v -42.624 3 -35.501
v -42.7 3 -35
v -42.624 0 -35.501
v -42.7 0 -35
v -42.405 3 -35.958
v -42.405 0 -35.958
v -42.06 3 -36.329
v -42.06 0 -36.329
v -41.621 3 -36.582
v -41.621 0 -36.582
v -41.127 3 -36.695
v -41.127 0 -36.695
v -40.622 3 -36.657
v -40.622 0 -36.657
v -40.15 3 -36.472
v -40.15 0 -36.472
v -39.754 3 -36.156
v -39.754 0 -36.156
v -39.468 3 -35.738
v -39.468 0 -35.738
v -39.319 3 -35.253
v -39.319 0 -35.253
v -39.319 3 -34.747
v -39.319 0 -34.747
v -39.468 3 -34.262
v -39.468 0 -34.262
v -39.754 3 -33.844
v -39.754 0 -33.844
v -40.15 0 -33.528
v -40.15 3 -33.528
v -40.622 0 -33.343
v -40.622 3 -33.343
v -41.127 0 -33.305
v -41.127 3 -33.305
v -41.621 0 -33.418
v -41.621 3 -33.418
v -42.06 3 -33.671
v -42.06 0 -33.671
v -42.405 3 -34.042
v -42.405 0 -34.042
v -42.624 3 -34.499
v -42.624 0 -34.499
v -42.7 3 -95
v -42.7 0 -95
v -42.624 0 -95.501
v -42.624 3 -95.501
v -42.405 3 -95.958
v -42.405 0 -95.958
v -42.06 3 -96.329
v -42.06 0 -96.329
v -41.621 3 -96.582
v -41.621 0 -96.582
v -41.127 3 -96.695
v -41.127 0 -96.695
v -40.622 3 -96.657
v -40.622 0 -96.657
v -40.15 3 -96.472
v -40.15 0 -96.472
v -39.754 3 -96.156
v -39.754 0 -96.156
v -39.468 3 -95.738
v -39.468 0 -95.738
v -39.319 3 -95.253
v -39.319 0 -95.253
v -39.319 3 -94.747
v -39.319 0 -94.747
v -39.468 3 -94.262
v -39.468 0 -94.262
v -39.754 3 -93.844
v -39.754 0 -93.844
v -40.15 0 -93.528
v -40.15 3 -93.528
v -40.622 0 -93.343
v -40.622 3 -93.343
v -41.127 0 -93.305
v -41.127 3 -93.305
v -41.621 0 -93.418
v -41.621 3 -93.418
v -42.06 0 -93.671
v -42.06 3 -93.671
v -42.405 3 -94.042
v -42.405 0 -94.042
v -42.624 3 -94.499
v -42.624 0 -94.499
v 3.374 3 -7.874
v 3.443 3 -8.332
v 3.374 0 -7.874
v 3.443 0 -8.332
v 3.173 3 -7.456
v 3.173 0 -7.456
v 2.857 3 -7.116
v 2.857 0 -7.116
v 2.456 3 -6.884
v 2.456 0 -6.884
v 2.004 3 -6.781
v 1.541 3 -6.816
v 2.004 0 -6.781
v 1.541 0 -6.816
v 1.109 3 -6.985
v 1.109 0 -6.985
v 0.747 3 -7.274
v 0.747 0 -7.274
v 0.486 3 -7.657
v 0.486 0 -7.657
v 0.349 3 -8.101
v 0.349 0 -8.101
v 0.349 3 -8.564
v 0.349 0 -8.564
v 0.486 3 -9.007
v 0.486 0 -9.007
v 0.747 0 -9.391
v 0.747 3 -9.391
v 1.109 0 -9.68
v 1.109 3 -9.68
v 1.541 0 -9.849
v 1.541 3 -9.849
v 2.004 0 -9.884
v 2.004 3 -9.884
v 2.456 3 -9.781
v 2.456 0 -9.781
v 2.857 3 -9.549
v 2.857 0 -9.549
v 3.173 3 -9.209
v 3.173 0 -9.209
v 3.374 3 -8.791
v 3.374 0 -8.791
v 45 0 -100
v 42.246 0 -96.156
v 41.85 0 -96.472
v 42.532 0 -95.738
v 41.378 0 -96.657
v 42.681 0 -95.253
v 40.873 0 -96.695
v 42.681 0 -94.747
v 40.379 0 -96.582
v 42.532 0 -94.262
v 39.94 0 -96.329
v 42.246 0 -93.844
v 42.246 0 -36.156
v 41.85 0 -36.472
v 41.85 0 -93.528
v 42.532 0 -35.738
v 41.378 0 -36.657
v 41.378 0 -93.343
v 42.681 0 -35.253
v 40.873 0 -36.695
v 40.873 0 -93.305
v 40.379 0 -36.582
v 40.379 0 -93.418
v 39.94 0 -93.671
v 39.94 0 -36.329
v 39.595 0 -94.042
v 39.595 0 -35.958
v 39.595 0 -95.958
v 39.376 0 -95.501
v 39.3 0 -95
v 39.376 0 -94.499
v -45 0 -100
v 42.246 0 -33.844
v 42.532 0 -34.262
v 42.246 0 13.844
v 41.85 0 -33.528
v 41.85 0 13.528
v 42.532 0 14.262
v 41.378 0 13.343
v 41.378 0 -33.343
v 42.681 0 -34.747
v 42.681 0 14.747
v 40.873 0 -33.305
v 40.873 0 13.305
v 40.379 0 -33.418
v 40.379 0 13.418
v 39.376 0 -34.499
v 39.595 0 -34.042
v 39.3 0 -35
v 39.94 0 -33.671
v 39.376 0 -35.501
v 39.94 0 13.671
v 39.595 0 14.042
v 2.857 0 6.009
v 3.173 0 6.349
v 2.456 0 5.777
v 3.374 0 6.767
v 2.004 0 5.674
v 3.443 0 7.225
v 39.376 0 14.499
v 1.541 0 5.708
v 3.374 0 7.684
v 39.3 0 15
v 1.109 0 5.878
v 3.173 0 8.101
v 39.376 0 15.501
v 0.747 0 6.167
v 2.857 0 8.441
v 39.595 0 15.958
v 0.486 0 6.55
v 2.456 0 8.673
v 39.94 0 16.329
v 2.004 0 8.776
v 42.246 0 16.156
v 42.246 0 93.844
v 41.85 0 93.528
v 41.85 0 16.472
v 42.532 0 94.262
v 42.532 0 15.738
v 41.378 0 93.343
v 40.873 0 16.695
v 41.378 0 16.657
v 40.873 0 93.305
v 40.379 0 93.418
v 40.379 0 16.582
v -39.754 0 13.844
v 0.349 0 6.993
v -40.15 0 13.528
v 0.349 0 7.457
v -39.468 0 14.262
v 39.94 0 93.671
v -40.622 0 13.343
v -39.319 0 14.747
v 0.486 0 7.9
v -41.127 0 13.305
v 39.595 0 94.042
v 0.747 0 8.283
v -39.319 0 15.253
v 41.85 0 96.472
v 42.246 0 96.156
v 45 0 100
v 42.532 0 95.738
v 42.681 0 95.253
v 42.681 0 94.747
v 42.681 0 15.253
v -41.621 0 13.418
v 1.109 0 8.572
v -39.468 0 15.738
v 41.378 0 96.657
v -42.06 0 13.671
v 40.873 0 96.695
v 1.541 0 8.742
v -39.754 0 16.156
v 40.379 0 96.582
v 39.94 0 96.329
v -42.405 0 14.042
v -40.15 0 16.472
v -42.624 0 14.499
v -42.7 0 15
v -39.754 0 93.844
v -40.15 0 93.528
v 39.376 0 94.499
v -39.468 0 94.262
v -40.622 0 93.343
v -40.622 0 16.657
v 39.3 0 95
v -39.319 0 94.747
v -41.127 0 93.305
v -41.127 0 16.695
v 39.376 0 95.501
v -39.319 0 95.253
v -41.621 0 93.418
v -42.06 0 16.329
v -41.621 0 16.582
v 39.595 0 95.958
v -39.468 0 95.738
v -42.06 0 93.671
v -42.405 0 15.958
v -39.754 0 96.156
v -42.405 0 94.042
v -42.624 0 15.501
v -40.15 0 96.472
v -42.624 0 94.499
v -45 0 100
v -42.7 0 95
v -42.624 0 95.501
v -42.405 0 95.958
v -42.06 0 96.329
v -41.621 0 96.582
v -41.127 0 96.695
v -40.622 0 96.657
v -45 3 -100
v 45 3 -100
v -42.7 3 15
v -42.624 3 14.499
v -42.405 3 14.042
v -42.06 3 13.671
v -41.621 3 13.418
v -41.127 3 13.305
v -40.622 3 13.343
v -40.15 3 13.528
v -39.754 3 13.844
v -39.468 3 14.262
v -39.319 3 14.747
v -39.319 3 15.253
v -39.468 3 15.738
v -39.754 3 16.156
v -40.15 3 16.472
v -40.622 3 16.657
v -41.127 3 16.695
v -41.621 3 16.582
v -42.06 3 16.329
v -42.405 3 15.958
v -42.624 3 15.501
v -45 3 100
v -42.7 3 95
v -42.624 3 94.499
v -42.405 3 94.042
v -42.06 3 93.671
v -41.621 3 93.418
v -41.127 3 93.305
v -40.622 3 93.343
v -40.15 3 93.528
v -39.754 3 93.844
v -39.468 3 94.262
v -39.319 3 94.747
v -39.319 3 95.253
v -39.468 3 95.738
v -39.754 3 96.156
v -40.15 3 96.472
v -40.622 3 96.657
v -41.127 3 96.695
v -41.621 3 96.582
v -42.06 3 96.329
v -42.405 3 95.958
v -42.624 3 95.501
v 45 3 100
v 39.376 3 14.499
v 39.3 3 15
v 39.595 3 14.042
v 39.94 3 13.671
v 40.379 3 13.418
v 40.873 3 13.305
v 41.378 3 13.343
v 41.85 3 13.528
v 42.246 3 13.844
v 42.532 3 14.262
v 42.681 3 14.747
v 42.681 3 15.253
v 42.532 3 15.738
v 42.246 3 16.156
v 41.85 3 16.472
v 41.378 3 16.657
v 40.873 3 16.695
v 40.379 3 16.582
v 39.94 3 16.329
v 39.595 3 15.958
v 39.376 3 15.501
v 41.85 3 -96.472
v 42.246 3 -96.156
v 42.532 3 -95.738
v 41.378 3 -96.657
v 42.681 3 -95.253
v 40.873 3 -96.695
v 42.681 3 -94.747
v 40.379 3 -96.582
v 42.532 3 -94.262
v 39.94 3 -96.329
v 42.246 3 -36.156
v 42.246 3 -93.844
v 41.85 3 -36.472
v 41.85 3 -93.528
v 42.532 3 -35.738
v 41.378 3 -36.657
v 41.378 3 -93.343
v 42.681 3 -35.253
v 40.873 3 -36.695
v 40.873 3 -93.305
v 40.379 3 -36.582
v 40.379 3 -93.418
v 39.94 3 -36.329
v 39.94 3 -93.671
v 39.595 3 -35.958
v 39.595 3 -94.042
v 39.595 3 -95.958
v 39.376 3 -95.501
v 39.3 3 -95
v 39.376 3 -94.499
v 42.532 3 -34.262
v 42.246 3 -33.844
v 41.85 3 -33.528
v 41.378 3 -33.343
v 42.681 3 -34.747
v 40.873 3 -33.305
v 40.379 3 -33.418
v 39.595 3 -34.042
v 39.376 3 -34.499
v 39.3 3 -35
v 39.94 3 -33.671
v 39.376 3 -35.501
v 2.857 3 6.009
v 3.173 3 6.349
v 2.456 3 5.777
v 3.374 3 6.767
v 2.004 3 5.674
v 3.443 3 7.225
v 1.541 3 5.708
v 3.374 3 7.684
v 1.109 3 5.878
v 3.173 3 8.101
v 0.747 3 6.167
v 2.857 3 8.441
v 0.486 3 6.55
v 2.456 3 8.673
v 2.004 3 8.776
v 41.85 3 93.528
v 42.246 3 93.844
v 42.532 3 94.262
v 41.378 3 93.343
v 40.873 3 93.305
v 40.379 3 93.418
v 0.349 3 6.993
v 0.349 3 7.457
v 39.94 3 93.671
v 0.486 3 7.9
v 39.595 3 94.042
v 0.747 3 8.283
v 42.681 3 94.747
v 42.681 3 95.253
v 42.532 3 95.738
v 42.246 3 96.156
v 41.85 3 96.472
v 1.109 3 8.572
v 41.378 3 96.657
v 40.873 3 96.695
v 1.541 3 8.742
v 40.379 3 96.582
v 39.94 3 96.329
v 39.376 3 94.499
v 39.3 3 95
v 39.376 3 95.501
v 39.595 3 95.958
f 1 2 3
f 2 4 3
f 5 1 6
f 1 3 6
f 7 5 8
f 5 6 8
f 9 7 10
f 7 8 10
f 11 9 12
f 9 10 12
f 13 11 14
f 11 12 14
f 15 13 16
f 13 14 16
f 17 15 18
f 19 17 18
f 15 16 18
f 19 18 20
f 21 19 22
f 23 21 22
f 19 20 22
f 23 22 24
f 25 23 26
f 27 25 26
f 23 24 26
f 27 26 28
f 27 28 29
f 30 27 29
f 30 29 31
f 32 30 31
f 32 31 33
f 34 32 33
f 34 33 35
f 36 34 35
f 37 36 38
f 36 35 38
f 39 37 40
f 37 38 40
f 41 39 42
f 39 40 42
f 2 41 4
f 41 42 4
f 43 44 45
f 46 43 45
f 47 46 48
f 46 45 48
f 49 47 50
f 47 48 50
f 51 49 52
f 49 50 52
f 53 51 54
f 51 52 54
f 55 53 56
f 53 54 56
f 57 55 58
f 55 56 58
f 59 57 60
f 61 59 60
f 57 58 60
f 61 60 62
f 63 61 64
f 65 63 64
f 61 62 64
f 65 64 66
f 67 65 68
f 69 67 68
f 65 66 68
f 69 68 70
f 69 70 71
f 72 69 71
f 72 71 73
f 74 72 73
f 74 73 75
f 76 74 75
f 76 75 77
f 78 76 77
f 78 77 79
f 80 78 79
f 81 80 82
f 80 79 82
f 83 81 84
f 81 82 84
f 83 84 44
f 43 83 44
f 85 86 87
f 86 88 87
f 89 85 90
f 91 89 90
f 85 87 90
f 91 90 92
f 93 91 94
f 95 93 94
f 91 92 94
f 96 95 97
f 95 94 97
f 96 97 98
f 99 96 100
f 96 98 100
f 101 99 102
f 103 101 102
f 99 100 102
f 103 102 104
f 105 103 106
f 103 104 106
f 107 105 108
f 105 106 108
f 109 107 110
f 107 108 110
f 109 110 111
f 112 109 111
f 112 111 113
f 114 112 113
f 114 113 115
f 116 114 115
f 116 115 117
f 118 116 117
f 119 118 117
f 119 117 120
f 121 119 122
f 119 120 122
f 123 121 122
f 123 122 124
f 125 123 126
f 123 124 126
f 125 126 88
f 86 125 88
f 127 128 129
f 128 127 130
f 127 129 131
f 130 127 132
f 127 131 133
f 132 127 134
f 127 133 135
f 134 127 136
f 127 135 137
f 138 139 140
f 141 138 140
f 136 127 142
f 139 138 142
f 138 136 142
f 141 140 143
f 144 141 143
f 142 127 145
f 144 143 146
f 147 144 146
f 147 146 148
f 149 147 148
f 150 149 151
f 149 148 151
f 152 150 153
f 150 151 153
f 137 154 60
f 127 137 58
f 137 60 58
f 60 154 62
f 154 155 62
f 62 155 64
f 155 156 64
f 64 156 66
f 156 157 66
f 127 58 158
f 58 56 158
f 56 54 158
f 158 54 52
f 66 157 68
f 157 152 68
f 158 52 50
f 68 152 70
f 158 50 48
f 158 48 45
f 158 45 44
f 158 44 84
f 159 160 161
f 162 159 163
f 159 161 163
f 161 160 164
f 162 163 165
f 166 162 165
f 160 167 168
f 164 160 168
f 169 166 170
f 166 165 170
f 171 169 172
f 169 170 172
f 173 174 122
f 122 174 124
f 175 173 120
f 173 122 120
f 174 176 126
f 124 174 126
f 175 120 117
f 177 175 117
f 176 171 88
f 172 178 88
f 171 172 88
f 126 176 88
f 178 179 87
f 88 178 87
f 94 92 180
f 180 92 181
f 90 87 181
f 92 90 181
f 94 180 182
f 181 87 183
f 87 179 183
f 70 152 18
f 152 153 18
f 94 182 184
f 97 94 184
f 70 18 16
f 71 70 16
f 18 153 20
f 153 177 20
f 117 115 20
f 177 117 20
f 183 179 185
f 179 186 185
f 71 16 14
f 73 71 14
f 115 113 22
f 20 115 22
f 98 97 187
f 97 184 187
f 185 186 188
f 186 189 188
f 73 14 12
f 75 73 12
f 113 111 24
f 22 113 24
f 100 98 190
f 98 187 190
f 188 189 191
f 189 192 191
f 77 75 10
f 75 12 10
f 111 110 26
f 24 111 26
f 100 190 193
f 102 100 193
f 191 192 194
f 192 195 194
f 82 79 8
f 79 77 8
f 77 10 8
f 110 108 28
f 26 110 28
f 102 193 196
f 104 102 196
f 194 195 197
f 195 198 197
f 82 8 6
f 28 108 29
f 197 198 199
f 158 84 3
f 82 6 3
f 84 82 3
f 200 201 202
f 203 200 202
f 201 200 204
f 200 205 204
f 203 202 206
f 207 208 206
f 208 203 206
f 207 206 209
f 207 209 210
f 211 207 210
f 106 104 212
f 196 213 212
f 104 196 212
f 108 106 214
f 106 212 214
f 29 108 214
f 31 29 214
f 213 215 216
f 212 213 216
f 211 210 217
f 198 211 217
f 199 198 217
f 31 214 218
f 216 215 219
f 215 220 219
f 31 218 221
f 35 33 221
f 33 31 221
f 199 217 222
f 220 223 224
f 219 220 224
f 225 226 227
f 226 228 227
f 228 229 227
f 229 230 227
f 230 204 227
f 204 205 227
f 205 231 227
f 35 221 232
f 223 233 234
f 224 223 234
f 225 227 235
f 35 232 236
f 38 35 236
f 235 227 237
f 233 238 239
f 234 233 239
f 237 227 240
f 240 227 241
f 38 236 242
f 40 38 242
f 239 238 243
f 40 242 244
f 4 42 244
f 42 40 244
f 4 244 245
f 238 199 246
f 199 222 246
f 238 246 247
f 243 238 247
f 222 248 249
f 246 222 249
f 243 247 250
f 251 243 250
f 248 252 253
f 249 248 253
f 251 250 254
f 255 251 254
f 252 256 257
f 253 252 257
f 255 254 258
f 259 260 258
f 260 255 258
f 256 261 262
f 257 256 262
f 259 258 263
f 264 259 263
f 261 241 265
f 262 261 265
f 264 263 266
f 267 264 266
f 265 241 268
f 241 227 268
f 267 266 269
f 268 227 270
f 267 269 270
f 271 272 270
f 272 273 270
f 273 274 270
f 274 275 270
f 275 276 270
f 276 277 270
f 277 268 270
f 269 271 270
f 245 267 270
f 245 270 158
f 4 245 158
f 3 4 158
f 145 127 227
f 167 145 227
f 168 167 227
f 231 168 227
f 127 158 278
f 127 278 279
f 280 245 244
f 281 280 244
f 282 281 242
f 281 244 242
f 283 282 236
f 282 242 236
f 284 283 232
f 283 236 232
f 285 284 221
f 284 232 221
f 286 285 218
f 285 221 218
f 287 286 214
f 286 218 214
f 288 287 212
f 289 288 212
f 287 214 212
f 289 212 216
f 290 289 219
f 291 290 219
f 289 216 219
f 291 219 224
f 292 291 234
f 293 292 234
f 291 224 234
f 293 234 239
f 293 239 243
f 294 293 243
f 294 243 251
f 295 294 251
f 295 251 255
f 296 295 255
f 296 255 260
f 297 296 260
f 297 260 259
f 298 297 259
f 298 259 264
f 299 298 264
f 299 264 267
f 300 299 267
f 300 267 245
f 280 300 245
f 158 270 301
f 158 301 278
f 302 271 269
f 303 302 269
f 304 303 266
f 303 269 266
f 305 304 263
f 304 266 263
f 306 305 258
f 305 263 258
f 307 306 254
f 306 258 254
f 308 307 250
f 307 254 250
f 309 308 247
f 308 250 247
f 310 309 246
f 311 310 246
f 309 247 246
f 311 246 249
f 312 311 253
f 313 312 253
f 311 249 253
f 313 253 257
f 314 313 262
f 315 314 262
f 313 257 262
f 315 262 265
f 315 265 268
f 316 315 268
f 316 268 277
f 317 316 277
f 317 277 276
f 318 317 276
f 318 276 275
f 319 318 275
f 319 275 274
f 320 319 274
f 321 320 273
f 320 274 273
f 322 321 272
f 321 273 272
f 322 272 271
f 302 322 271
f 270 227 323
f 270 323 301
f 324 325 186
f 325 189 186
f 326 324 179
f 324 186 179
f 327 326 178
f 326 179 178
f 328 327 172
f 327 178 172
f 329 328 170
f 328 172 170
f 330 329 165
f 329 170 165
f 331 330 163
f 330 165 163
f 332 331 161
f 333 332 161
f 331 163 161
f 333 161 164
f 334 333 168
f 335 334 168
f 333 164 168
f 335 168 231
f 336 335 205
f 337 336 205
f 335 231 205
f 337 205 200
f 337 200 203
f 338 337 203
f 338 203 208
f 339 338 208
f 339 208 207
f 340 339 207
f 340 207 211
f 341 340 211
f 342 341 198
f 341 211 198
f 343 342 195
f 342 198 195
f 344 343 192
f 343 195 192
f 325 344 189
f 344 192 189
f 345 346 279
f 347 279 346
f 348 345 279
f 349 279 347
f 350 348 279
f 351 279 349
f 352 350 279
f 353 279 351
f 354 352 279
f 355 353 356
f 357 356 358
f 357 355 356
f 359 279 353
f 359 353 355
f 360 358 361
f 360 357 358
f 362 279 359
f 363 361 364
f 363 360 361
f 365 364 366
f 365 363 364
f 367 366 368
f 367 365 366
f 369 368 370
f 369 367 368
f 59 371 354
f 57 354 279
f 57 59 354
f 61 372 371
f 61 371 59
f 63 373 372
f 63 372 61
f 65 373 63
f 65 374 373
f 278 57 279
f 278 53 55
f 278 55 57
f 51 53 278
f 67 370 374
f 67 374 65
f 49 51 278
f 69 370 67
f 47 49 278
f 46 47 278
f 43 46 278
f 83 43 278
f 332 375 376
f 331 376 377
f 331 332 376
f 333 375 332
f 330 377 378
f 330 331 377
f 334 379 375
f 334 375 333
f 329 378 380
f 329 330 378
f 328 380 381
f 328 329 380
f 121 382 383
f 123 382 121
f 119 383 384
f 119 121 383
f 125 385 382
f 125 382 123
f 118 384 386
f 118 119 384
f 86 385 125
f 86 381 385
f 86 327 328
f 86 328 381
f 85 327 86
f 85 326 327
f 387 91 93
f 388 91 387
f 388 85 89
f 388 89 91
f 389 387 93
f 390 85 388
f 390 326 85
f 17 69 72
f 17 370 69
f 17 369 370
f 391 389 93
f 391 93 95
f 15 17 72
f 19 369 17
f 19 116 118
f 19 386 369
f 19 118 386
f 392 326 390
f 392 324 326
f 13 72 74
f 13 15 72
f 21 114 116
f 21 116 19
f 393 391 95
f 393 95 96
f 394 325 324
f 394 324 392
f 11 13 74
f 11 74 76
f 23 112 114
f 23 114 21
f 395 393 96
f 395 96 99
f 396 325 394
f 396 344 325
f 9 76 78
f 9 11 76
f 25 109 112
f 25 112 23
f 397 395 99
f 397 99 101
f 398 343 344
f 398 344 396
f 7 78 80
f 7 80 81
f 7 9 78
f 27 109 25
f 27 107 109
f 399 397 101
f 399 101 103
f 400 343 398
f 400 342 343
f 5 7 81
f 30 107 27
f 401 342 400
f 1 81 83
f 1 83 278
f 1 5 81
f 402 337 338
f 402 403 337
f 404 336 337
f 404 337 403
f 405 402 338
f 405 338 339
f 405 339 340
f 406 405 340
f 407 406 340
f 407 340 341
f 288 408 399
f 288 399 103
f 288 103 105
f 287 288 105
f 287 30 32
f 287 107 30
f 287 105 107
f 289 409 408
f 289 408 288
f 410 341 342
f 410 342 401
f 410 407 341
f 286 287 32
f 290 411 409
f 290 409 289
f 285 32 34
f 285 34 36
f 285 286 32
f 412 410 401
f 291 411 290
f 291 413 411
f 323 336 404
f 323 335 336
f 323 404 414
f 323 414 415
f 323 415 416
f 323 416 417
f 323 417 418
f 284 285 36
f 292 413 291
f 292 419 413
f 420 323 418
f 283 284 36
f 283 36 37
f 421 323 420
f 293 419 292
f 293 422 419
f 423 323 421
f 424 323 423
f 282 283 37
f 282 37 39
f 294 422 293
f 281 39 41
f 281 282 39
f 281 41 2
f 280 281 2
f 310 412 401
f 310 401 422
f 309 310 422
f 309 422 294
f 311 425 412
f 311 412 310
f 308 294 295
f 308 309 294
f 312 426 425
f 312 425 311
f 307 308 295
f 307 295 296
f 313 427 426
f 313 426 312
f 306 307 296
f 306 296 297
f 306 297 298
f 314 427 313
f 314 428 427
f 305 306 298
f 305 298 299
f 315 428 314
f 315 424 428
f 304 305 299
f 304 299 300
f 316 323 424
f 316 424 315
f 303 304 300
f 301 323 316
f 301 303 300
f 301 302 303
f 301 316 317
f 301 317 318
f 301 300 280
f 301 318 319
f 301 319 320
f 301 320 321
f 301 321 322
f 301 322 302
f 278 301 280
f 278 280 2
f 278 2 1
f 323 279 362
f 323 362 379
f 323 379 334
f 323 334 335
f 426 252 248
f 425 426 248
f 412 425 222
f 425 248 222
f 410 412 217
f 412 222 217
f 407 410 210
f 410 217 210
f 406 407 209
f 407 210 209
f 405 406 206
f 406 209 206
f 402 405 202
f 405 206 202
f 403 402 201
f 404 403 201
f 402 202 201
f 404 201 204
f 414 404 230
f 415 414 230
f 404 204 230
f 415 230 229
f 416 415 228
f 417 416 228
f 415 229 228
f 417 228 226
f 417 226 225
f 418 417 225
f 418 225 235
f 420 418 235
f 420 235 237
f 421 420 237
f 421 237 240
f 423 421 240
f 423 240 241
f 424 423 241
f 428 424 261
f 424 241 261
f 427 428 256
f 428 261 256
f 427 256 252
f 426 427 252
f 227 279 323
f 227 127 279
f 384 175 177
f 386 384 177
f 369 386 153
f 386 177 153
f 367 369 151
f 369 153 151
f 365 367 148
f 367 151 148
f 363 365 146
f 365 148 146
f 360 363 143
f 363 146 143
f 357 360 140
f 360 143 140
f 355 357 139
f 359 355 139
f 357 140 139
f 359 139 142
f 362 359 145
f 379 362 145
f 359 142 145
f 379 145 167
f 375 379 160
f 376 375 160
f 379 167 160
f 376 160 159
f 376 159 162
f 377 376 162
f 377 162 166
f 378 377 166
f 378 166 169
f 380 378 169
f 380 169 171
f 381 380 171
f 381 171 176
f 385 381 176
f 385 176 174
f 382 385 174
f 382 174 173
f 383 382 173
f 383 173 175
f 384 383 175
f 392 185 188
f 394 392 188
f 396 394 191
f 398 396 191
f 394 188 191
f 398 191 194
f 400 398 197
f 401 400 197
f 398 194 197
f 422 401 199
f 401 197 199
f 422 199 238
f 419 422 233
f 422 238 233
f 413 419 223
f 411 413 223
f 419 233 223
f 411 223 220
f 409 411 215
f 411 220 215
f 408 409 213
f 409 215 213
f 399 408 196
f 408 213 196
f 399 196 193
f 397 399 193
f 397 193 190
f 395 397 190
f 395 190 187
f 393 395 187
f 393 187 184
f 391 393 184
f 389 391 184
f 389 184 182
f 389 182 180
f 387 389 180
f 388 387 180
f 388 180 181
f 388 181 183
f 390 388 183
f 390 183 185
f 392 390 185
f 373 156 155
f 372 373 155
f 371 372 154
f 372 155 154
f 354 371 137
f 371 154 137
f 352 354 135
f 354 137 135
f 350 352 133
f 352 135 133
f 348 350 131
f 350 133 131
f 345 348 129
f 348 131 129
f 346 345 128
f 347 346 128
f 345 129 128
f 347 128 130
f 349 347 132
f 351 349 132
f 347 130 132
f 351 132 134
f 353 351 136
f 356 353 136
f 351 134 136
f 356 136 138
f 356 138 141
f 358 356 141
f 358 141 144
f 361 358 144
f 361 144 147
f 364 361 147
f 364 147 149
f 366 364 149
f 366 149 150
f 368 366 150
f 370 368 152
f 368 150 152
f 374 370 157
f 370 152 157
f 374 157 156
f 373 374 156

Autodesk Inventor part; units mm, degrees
ref_plane "YZ Plane" through (0, 0, 0) normal (1, 0, 0) x (0, 1, 0)
ref_plane "XZ Plane" through (0, 0, 0) normal (0, 1, 0) x (-1, 0, 0)
ref_plane "XY Plane" through (0, 0, 0) normal (0, 0, 1) x (1, 0, 0)
sketch "Skizze1" plane through (0, 0, 0) normal (0, 1, 0) x (-1, 0, 0)
  line L0 (45, 100) -> (45, -100)
  line L1 (45, -100) -> (-45, -100)
  line L2 (-45, -100) -> (-45, 100)
  line L3 (-45, 100) -> (45, 100)
  line L4 (0, 61.8387) -> (0, -129.7607) construction
  line L5 (83.0665, 0) -> (-88.5254, 0) construction
  circle A0 centre (41, 95) radius 1.7
  circle A1 centre (-41, 95) radius 1.7
  circle A2 centre (-41, -95) radius 1.7
  circle A3 centre (41, -95) radius 1.7
  circle A4 centre (3.1127, 7.2251) radius 1.5558
  circle A5 centre (3.1127, -8.3324) radius 1.5558
  circle A6 centre (-41, 15) radius 1.7
  circle A7 centre (41, 15) radius 1.7
  circle A8 centre (-41, -65) radius 1.7
  circle A9 centre (41, -65) radius 1.7
  circle A10 centre (-41, -145) radius 1.7
  circle A11 centre (41, -145) radius 1.7
  circle A12 centre (-41, -225) radius 1.7
  circle A13 centre (41, -225) radius 1.7
  circle A14 centre (-41, -305) radius 1.7
  circle A15 centre (41, -305) radius 1.7
  circle A16 centre (-41, -385) radius 1.7
  circle A17 centre (41, -385) radius 1.7
  circle A18 centre (-41, -465) radius 1.7
  circle A19 centre (41, -465) radius 1.7
  circle A20 centre (-41, -545) radius 1.7
  circle A21 centre (41, -545) radius 1.7
  circle A22 centre (-41, -625) radius 1.7
  circle A23 centre (41, -625) radius 1.7
  circle A24 centre (-41, -705) radius 1.7
  circle A25 centre (41, -705) radius 1.7
  circle A26 centre (-41, -785) radius 1.7
  circle A27 centre (41, -785) radius 1.7
  circle A28 centre (-41, -865) radius 1.7
  circle A29 centre (41, -865) radius 1.7
  circle A30 centre (-41, -945) radius 1.7
  circle A31 centre (41, -945) radius 1.7
  circle A32 centre (-41, -1025) radius 1.7
  circle A33 centre (41, -1025) radius 1.7
  circle A34 centre (-41, -1105) radius 1.7
  circle A35 centre (41, -1105) radius 1.7
  circle A36 centre (-41, -1185) radius 1.7
  circle A37 centre (41, -1185) radius 1.7
  circle A38 centre (-41, -1265) radius 1.7
  circle A39 centre (41, -1265) radius 1.7
  circle A40 centre (-41, -1345) radius 1.7
  circle A41 centre (41, -1345) radius 1.7
  circle A42 centre (-41, -1425) radius 1.7
  circle A43 centre (41, -1425) radius 1.7
  circle A44 centre (-41, -1505) radius 1.7
  circle A45 centre (41, -1505) radius 1.7
  circle A46 centre (-41, -1585) radius 1.7
  circle A47 centre (41, -1585) radius 1.7
  circle A48 centre (-41, -1665) radius 1.7
  circle A49 centre (41, -1665) radius 1.7
  circle A50 centre (-41, -1745) radius 1.7
  circle A51 centre (41, -1745) radius 1.7
  circle A52 centre (-41, -1825) radius 1.7
  circle A53 centre (41, -1825) radius 1.7
  circle A54 centre (-41, -1905) radius 1.7
  circle A55 centre (41, -1905) radius 1.7
  circle A56 centre (-41, -1985) radius 1.7
  circle A57 centre (41, -1985) radius 1.7
  circle A58 centre (-41, -2065) radius 1.7
  circle A59 centre (41, -2065) radius 1.7
  circle A60 centre (-41, -2145) radius 1.7
  circle A61 centre (41, -2145) radius 1.7
  circle A62 centre (-41, -2225) radius 1.7
  circle A63 centre (41, -2225) radius 1.7
  circle A64 centre (-41, -2305) radius 1.7
  circle A65 centre (41, -2305) radius 1.7
  circle A66 centre (-41, -2385) radius 1.7
  circle A67 centre (41, -2385) radius 1.7
  circle A68 centre (-41, -2465) radius 1.7
  circle A69 centre (41, -2465) radius 1.7
  circle A70 centre (-41, -2545) radius 1.7
  circle A71 centre (41, -2545) radius 1.7
  circle A72 centre (-41, -2625) radius 1.7
  circle A73 centre (41, -2625) radius 1.7
  circle A74 centre (-41, -2705) radius 1.7
  circle A75 centre (41, -2705) radius 1.7
  circle A76 centre (-41, -2785) radius 1.7
  circle A77 centre (41, -2785) radius 1.7
  circle A78 centre (-41, -2865) radius 1.7
  circle A79 centre (41, -2865) radius 1.7
  circle A80 centre (-41, -2945) radius 1.7
  circle A81 centre (41, -2945) radius 1.7
  circle A82 centre (-41, -3025) radius 1.7
  circle A83 centre (41, -3025) radius 1.7
  circle A84 centre (-41, -3105) radius 1.7
  circle A85 centre (41, -3105) radius 1.7
  circle A86 centre (-41, -3185) radius 1.7
  circle A87 centre (41, -3185) radius 1.7
  circle A88 centre (-41, -3265) radius 1.7
  circle A89 centre (41, -3265) radius 1.7
  circle A90 centre (-41, -3345) radius 1.7
  circle A91 centre (41, -3345) radius 1.7
  circle A92 centre (-41, -3425) radius 1.7
  circle A93 centre (41, -3425) radius 1.7
  circle A94 centre (-41, -3505) radius 1.7
  circle A95 centre (41, -3505) radius 1.7
  circle A96 centre (-41, -3585) radius 1.7
  circle A97 centre (41, -3585) radius 1.7
  circle A98 centre (-41, -3665) radius 1.7
  circle A99 centre (41, -3665) radius 1.7
  circle A100 centre (-41, -3745) radius 1.7
  circle A101 centre (41, -3745) radius 1.7
  circle A102 centre (-41, -3825) radius 1.7
  circle A103 centre (41, -3825) radius 1.7
  circle A104 centre (-41, -3905) radius 1.7
  circle A105 centre (41, -3905) radius 1.7
  circle A106 centre (-41, -3985) radius 1.7
  circle A107 centre (41, -3985) radius 1.7
  circle A108 centre (-41, -4065) radius 1.7
  circle A109 centre (41, -4065) radius 1.7
  circle A110 centre (-41, -4145) radius 1.7
  circle A111 centre (41, -4145) radius 1.7
  circle A112 centre (-41, -4225) radius 1.7
  circle A113 centre (41, -4225) radius 1.7
  circle A114 centre (-41, -4305) radius 1.7
  circle A115 centre (41, -4305) radius 1.7
  circle A116 centre (-41, -4385) radius 1.7
  circle A117 centre (41, -4385) radius 1.7
  circle A118 centre (-41, -4465) radius 1.7
  circle A119 centre (41, -4465) radius 1.7
  circle A120 centre (-41, -4545) radius 1.7
  circle A121 centre (41, -4545) radius 1.7
  circle A122 centre (-41, -4625) radius 1.7
  circle A123 centre (41, -4625) radius 1.7
  circle A124 centre (-41, -4705) radius 1.7
  circle A125 centre (41, -4705) radius 1.7
  circle A126 centre (-41, -4785) radius 1.7
  circle A127 centre (41, -4785) radius 1.7
  circle A128 centre (-41, -4865) radius 1.7
  circle A129 centre (41, -4865) radius 1.7
  circle A130 centre (-41, -4945) radius 1.7
  circle A131 centre (41, -4945) radius 1.7
  circle A132 centre (-41, -5025) radius 1.7
  circle A133 centre (41, -5025) radius 1.7
  circle A134 centre (-41, -5105) radius 1.7
  circle A135 centre (41, -5105) radius 1.7
  circle A136 centre (-41, -5185) radius 1.7
  circle A137 centre (41, -5185) radius 1.7
  circle A138 centre (-41, -5265) radius 1.7
  circle A139 centre (41, -5265) radius 1.7
  circle A140 centre (-41, -5345) radius 1.7
  circle A141 centre (41, -5345) radius 1.7
  circle A142 centre (-41, -5425) radius 1.7
  circle A143 centre (41, -5425) radius 1.7
  circle A144 centre (-41, -5505) radius 1.7
  circle A145 centre (41, -5505) radius 1.7
  circle A146 centre (-41, -5585) radius 1.7
  circle A147 centre (41, -5585) radius 1.7
  circle A148 centre (-41, -5665) radius 1.7
  circle A149 centre (41, -5665) radius 1.7
  circle A150 centre (-41, -5745) radius 1.7
  circle A151 centre (41, -5745) radius 1.7
  circle A152 centre (-41, -5825) radius 1.7
  circle A153 centre (41, -5825) radius 1.7
  circle A154 centre (-41, -5905) radius 1.7
  circle A155 centre (41, -5905) radius 1.7
  circle A156 centre (-41, -5985) radius 1.7
  circle A157 centre (41, -5985) radius 1.7
  circle A158 centre (-41, -6065) radius 1.7
  circle A159 centre (41, -6065) radius 1.7
  circle A160 centre (-41, -6145) radius 1.7
  circle A161 centre (41, -6145) radius 1.7
  circle A162 centre (-41, -6225) radius 1.7
  circle A163 centre (41, -6225) radius 1.7
  circle A164 centre (-41, -35) radius 1.7
  circle A165 centre (41, -35) radius 1.7
  point P0 (0, 0)
  dimension "d1" = 45
  dimension "d2" = 45
  dimension "d3" = 100
  dimension "d4" = 100
  dimension "d7" = 3.4
  dimension "d8" = 4
  dimension "d9" = 5
  dimension "d10" = 3.4
  dimension "d11" = 4
  dimension "d12" = 5
  dimension "d13" = 3.4
  dimension "d14" = 4
  dimension "d15" = 5
  dimension "d16" = 3.4
  dimension "d17" = 5
  dimension "d18" = 4
  dimension "d25" = 80
  dimension "d32" = 50
extrude "Extrusion1" add sketch "Skizze1" along normal blind 3 contours L0 L1 L2 L3 | A0 | A1 | A2 | A3 | A4 | A5 | A6 | A7 | A8 | A9 | A164 | A165
extrude "Extrusion2" cut sketch "Skizze1" along normal blind 10 contours A0 | A1 | A2 | A3 | A6 | A7 | A164 | A165
sketch "Skizze2" plane through (0, 0, 0) normal (0, -1, 0) x (1, 0, 0)
  circle A0 centre (1.8873, 7.2251) radius 1.5557 projected
  circle A1 centre (1.8873, -8.3324) radius 1.5557 projected
  point P0 (0, 0)
extrude "Extrusion3" cut sketch "Skizze2" against normal blind 10
properties part number "Chassis-2" material "CFK"
